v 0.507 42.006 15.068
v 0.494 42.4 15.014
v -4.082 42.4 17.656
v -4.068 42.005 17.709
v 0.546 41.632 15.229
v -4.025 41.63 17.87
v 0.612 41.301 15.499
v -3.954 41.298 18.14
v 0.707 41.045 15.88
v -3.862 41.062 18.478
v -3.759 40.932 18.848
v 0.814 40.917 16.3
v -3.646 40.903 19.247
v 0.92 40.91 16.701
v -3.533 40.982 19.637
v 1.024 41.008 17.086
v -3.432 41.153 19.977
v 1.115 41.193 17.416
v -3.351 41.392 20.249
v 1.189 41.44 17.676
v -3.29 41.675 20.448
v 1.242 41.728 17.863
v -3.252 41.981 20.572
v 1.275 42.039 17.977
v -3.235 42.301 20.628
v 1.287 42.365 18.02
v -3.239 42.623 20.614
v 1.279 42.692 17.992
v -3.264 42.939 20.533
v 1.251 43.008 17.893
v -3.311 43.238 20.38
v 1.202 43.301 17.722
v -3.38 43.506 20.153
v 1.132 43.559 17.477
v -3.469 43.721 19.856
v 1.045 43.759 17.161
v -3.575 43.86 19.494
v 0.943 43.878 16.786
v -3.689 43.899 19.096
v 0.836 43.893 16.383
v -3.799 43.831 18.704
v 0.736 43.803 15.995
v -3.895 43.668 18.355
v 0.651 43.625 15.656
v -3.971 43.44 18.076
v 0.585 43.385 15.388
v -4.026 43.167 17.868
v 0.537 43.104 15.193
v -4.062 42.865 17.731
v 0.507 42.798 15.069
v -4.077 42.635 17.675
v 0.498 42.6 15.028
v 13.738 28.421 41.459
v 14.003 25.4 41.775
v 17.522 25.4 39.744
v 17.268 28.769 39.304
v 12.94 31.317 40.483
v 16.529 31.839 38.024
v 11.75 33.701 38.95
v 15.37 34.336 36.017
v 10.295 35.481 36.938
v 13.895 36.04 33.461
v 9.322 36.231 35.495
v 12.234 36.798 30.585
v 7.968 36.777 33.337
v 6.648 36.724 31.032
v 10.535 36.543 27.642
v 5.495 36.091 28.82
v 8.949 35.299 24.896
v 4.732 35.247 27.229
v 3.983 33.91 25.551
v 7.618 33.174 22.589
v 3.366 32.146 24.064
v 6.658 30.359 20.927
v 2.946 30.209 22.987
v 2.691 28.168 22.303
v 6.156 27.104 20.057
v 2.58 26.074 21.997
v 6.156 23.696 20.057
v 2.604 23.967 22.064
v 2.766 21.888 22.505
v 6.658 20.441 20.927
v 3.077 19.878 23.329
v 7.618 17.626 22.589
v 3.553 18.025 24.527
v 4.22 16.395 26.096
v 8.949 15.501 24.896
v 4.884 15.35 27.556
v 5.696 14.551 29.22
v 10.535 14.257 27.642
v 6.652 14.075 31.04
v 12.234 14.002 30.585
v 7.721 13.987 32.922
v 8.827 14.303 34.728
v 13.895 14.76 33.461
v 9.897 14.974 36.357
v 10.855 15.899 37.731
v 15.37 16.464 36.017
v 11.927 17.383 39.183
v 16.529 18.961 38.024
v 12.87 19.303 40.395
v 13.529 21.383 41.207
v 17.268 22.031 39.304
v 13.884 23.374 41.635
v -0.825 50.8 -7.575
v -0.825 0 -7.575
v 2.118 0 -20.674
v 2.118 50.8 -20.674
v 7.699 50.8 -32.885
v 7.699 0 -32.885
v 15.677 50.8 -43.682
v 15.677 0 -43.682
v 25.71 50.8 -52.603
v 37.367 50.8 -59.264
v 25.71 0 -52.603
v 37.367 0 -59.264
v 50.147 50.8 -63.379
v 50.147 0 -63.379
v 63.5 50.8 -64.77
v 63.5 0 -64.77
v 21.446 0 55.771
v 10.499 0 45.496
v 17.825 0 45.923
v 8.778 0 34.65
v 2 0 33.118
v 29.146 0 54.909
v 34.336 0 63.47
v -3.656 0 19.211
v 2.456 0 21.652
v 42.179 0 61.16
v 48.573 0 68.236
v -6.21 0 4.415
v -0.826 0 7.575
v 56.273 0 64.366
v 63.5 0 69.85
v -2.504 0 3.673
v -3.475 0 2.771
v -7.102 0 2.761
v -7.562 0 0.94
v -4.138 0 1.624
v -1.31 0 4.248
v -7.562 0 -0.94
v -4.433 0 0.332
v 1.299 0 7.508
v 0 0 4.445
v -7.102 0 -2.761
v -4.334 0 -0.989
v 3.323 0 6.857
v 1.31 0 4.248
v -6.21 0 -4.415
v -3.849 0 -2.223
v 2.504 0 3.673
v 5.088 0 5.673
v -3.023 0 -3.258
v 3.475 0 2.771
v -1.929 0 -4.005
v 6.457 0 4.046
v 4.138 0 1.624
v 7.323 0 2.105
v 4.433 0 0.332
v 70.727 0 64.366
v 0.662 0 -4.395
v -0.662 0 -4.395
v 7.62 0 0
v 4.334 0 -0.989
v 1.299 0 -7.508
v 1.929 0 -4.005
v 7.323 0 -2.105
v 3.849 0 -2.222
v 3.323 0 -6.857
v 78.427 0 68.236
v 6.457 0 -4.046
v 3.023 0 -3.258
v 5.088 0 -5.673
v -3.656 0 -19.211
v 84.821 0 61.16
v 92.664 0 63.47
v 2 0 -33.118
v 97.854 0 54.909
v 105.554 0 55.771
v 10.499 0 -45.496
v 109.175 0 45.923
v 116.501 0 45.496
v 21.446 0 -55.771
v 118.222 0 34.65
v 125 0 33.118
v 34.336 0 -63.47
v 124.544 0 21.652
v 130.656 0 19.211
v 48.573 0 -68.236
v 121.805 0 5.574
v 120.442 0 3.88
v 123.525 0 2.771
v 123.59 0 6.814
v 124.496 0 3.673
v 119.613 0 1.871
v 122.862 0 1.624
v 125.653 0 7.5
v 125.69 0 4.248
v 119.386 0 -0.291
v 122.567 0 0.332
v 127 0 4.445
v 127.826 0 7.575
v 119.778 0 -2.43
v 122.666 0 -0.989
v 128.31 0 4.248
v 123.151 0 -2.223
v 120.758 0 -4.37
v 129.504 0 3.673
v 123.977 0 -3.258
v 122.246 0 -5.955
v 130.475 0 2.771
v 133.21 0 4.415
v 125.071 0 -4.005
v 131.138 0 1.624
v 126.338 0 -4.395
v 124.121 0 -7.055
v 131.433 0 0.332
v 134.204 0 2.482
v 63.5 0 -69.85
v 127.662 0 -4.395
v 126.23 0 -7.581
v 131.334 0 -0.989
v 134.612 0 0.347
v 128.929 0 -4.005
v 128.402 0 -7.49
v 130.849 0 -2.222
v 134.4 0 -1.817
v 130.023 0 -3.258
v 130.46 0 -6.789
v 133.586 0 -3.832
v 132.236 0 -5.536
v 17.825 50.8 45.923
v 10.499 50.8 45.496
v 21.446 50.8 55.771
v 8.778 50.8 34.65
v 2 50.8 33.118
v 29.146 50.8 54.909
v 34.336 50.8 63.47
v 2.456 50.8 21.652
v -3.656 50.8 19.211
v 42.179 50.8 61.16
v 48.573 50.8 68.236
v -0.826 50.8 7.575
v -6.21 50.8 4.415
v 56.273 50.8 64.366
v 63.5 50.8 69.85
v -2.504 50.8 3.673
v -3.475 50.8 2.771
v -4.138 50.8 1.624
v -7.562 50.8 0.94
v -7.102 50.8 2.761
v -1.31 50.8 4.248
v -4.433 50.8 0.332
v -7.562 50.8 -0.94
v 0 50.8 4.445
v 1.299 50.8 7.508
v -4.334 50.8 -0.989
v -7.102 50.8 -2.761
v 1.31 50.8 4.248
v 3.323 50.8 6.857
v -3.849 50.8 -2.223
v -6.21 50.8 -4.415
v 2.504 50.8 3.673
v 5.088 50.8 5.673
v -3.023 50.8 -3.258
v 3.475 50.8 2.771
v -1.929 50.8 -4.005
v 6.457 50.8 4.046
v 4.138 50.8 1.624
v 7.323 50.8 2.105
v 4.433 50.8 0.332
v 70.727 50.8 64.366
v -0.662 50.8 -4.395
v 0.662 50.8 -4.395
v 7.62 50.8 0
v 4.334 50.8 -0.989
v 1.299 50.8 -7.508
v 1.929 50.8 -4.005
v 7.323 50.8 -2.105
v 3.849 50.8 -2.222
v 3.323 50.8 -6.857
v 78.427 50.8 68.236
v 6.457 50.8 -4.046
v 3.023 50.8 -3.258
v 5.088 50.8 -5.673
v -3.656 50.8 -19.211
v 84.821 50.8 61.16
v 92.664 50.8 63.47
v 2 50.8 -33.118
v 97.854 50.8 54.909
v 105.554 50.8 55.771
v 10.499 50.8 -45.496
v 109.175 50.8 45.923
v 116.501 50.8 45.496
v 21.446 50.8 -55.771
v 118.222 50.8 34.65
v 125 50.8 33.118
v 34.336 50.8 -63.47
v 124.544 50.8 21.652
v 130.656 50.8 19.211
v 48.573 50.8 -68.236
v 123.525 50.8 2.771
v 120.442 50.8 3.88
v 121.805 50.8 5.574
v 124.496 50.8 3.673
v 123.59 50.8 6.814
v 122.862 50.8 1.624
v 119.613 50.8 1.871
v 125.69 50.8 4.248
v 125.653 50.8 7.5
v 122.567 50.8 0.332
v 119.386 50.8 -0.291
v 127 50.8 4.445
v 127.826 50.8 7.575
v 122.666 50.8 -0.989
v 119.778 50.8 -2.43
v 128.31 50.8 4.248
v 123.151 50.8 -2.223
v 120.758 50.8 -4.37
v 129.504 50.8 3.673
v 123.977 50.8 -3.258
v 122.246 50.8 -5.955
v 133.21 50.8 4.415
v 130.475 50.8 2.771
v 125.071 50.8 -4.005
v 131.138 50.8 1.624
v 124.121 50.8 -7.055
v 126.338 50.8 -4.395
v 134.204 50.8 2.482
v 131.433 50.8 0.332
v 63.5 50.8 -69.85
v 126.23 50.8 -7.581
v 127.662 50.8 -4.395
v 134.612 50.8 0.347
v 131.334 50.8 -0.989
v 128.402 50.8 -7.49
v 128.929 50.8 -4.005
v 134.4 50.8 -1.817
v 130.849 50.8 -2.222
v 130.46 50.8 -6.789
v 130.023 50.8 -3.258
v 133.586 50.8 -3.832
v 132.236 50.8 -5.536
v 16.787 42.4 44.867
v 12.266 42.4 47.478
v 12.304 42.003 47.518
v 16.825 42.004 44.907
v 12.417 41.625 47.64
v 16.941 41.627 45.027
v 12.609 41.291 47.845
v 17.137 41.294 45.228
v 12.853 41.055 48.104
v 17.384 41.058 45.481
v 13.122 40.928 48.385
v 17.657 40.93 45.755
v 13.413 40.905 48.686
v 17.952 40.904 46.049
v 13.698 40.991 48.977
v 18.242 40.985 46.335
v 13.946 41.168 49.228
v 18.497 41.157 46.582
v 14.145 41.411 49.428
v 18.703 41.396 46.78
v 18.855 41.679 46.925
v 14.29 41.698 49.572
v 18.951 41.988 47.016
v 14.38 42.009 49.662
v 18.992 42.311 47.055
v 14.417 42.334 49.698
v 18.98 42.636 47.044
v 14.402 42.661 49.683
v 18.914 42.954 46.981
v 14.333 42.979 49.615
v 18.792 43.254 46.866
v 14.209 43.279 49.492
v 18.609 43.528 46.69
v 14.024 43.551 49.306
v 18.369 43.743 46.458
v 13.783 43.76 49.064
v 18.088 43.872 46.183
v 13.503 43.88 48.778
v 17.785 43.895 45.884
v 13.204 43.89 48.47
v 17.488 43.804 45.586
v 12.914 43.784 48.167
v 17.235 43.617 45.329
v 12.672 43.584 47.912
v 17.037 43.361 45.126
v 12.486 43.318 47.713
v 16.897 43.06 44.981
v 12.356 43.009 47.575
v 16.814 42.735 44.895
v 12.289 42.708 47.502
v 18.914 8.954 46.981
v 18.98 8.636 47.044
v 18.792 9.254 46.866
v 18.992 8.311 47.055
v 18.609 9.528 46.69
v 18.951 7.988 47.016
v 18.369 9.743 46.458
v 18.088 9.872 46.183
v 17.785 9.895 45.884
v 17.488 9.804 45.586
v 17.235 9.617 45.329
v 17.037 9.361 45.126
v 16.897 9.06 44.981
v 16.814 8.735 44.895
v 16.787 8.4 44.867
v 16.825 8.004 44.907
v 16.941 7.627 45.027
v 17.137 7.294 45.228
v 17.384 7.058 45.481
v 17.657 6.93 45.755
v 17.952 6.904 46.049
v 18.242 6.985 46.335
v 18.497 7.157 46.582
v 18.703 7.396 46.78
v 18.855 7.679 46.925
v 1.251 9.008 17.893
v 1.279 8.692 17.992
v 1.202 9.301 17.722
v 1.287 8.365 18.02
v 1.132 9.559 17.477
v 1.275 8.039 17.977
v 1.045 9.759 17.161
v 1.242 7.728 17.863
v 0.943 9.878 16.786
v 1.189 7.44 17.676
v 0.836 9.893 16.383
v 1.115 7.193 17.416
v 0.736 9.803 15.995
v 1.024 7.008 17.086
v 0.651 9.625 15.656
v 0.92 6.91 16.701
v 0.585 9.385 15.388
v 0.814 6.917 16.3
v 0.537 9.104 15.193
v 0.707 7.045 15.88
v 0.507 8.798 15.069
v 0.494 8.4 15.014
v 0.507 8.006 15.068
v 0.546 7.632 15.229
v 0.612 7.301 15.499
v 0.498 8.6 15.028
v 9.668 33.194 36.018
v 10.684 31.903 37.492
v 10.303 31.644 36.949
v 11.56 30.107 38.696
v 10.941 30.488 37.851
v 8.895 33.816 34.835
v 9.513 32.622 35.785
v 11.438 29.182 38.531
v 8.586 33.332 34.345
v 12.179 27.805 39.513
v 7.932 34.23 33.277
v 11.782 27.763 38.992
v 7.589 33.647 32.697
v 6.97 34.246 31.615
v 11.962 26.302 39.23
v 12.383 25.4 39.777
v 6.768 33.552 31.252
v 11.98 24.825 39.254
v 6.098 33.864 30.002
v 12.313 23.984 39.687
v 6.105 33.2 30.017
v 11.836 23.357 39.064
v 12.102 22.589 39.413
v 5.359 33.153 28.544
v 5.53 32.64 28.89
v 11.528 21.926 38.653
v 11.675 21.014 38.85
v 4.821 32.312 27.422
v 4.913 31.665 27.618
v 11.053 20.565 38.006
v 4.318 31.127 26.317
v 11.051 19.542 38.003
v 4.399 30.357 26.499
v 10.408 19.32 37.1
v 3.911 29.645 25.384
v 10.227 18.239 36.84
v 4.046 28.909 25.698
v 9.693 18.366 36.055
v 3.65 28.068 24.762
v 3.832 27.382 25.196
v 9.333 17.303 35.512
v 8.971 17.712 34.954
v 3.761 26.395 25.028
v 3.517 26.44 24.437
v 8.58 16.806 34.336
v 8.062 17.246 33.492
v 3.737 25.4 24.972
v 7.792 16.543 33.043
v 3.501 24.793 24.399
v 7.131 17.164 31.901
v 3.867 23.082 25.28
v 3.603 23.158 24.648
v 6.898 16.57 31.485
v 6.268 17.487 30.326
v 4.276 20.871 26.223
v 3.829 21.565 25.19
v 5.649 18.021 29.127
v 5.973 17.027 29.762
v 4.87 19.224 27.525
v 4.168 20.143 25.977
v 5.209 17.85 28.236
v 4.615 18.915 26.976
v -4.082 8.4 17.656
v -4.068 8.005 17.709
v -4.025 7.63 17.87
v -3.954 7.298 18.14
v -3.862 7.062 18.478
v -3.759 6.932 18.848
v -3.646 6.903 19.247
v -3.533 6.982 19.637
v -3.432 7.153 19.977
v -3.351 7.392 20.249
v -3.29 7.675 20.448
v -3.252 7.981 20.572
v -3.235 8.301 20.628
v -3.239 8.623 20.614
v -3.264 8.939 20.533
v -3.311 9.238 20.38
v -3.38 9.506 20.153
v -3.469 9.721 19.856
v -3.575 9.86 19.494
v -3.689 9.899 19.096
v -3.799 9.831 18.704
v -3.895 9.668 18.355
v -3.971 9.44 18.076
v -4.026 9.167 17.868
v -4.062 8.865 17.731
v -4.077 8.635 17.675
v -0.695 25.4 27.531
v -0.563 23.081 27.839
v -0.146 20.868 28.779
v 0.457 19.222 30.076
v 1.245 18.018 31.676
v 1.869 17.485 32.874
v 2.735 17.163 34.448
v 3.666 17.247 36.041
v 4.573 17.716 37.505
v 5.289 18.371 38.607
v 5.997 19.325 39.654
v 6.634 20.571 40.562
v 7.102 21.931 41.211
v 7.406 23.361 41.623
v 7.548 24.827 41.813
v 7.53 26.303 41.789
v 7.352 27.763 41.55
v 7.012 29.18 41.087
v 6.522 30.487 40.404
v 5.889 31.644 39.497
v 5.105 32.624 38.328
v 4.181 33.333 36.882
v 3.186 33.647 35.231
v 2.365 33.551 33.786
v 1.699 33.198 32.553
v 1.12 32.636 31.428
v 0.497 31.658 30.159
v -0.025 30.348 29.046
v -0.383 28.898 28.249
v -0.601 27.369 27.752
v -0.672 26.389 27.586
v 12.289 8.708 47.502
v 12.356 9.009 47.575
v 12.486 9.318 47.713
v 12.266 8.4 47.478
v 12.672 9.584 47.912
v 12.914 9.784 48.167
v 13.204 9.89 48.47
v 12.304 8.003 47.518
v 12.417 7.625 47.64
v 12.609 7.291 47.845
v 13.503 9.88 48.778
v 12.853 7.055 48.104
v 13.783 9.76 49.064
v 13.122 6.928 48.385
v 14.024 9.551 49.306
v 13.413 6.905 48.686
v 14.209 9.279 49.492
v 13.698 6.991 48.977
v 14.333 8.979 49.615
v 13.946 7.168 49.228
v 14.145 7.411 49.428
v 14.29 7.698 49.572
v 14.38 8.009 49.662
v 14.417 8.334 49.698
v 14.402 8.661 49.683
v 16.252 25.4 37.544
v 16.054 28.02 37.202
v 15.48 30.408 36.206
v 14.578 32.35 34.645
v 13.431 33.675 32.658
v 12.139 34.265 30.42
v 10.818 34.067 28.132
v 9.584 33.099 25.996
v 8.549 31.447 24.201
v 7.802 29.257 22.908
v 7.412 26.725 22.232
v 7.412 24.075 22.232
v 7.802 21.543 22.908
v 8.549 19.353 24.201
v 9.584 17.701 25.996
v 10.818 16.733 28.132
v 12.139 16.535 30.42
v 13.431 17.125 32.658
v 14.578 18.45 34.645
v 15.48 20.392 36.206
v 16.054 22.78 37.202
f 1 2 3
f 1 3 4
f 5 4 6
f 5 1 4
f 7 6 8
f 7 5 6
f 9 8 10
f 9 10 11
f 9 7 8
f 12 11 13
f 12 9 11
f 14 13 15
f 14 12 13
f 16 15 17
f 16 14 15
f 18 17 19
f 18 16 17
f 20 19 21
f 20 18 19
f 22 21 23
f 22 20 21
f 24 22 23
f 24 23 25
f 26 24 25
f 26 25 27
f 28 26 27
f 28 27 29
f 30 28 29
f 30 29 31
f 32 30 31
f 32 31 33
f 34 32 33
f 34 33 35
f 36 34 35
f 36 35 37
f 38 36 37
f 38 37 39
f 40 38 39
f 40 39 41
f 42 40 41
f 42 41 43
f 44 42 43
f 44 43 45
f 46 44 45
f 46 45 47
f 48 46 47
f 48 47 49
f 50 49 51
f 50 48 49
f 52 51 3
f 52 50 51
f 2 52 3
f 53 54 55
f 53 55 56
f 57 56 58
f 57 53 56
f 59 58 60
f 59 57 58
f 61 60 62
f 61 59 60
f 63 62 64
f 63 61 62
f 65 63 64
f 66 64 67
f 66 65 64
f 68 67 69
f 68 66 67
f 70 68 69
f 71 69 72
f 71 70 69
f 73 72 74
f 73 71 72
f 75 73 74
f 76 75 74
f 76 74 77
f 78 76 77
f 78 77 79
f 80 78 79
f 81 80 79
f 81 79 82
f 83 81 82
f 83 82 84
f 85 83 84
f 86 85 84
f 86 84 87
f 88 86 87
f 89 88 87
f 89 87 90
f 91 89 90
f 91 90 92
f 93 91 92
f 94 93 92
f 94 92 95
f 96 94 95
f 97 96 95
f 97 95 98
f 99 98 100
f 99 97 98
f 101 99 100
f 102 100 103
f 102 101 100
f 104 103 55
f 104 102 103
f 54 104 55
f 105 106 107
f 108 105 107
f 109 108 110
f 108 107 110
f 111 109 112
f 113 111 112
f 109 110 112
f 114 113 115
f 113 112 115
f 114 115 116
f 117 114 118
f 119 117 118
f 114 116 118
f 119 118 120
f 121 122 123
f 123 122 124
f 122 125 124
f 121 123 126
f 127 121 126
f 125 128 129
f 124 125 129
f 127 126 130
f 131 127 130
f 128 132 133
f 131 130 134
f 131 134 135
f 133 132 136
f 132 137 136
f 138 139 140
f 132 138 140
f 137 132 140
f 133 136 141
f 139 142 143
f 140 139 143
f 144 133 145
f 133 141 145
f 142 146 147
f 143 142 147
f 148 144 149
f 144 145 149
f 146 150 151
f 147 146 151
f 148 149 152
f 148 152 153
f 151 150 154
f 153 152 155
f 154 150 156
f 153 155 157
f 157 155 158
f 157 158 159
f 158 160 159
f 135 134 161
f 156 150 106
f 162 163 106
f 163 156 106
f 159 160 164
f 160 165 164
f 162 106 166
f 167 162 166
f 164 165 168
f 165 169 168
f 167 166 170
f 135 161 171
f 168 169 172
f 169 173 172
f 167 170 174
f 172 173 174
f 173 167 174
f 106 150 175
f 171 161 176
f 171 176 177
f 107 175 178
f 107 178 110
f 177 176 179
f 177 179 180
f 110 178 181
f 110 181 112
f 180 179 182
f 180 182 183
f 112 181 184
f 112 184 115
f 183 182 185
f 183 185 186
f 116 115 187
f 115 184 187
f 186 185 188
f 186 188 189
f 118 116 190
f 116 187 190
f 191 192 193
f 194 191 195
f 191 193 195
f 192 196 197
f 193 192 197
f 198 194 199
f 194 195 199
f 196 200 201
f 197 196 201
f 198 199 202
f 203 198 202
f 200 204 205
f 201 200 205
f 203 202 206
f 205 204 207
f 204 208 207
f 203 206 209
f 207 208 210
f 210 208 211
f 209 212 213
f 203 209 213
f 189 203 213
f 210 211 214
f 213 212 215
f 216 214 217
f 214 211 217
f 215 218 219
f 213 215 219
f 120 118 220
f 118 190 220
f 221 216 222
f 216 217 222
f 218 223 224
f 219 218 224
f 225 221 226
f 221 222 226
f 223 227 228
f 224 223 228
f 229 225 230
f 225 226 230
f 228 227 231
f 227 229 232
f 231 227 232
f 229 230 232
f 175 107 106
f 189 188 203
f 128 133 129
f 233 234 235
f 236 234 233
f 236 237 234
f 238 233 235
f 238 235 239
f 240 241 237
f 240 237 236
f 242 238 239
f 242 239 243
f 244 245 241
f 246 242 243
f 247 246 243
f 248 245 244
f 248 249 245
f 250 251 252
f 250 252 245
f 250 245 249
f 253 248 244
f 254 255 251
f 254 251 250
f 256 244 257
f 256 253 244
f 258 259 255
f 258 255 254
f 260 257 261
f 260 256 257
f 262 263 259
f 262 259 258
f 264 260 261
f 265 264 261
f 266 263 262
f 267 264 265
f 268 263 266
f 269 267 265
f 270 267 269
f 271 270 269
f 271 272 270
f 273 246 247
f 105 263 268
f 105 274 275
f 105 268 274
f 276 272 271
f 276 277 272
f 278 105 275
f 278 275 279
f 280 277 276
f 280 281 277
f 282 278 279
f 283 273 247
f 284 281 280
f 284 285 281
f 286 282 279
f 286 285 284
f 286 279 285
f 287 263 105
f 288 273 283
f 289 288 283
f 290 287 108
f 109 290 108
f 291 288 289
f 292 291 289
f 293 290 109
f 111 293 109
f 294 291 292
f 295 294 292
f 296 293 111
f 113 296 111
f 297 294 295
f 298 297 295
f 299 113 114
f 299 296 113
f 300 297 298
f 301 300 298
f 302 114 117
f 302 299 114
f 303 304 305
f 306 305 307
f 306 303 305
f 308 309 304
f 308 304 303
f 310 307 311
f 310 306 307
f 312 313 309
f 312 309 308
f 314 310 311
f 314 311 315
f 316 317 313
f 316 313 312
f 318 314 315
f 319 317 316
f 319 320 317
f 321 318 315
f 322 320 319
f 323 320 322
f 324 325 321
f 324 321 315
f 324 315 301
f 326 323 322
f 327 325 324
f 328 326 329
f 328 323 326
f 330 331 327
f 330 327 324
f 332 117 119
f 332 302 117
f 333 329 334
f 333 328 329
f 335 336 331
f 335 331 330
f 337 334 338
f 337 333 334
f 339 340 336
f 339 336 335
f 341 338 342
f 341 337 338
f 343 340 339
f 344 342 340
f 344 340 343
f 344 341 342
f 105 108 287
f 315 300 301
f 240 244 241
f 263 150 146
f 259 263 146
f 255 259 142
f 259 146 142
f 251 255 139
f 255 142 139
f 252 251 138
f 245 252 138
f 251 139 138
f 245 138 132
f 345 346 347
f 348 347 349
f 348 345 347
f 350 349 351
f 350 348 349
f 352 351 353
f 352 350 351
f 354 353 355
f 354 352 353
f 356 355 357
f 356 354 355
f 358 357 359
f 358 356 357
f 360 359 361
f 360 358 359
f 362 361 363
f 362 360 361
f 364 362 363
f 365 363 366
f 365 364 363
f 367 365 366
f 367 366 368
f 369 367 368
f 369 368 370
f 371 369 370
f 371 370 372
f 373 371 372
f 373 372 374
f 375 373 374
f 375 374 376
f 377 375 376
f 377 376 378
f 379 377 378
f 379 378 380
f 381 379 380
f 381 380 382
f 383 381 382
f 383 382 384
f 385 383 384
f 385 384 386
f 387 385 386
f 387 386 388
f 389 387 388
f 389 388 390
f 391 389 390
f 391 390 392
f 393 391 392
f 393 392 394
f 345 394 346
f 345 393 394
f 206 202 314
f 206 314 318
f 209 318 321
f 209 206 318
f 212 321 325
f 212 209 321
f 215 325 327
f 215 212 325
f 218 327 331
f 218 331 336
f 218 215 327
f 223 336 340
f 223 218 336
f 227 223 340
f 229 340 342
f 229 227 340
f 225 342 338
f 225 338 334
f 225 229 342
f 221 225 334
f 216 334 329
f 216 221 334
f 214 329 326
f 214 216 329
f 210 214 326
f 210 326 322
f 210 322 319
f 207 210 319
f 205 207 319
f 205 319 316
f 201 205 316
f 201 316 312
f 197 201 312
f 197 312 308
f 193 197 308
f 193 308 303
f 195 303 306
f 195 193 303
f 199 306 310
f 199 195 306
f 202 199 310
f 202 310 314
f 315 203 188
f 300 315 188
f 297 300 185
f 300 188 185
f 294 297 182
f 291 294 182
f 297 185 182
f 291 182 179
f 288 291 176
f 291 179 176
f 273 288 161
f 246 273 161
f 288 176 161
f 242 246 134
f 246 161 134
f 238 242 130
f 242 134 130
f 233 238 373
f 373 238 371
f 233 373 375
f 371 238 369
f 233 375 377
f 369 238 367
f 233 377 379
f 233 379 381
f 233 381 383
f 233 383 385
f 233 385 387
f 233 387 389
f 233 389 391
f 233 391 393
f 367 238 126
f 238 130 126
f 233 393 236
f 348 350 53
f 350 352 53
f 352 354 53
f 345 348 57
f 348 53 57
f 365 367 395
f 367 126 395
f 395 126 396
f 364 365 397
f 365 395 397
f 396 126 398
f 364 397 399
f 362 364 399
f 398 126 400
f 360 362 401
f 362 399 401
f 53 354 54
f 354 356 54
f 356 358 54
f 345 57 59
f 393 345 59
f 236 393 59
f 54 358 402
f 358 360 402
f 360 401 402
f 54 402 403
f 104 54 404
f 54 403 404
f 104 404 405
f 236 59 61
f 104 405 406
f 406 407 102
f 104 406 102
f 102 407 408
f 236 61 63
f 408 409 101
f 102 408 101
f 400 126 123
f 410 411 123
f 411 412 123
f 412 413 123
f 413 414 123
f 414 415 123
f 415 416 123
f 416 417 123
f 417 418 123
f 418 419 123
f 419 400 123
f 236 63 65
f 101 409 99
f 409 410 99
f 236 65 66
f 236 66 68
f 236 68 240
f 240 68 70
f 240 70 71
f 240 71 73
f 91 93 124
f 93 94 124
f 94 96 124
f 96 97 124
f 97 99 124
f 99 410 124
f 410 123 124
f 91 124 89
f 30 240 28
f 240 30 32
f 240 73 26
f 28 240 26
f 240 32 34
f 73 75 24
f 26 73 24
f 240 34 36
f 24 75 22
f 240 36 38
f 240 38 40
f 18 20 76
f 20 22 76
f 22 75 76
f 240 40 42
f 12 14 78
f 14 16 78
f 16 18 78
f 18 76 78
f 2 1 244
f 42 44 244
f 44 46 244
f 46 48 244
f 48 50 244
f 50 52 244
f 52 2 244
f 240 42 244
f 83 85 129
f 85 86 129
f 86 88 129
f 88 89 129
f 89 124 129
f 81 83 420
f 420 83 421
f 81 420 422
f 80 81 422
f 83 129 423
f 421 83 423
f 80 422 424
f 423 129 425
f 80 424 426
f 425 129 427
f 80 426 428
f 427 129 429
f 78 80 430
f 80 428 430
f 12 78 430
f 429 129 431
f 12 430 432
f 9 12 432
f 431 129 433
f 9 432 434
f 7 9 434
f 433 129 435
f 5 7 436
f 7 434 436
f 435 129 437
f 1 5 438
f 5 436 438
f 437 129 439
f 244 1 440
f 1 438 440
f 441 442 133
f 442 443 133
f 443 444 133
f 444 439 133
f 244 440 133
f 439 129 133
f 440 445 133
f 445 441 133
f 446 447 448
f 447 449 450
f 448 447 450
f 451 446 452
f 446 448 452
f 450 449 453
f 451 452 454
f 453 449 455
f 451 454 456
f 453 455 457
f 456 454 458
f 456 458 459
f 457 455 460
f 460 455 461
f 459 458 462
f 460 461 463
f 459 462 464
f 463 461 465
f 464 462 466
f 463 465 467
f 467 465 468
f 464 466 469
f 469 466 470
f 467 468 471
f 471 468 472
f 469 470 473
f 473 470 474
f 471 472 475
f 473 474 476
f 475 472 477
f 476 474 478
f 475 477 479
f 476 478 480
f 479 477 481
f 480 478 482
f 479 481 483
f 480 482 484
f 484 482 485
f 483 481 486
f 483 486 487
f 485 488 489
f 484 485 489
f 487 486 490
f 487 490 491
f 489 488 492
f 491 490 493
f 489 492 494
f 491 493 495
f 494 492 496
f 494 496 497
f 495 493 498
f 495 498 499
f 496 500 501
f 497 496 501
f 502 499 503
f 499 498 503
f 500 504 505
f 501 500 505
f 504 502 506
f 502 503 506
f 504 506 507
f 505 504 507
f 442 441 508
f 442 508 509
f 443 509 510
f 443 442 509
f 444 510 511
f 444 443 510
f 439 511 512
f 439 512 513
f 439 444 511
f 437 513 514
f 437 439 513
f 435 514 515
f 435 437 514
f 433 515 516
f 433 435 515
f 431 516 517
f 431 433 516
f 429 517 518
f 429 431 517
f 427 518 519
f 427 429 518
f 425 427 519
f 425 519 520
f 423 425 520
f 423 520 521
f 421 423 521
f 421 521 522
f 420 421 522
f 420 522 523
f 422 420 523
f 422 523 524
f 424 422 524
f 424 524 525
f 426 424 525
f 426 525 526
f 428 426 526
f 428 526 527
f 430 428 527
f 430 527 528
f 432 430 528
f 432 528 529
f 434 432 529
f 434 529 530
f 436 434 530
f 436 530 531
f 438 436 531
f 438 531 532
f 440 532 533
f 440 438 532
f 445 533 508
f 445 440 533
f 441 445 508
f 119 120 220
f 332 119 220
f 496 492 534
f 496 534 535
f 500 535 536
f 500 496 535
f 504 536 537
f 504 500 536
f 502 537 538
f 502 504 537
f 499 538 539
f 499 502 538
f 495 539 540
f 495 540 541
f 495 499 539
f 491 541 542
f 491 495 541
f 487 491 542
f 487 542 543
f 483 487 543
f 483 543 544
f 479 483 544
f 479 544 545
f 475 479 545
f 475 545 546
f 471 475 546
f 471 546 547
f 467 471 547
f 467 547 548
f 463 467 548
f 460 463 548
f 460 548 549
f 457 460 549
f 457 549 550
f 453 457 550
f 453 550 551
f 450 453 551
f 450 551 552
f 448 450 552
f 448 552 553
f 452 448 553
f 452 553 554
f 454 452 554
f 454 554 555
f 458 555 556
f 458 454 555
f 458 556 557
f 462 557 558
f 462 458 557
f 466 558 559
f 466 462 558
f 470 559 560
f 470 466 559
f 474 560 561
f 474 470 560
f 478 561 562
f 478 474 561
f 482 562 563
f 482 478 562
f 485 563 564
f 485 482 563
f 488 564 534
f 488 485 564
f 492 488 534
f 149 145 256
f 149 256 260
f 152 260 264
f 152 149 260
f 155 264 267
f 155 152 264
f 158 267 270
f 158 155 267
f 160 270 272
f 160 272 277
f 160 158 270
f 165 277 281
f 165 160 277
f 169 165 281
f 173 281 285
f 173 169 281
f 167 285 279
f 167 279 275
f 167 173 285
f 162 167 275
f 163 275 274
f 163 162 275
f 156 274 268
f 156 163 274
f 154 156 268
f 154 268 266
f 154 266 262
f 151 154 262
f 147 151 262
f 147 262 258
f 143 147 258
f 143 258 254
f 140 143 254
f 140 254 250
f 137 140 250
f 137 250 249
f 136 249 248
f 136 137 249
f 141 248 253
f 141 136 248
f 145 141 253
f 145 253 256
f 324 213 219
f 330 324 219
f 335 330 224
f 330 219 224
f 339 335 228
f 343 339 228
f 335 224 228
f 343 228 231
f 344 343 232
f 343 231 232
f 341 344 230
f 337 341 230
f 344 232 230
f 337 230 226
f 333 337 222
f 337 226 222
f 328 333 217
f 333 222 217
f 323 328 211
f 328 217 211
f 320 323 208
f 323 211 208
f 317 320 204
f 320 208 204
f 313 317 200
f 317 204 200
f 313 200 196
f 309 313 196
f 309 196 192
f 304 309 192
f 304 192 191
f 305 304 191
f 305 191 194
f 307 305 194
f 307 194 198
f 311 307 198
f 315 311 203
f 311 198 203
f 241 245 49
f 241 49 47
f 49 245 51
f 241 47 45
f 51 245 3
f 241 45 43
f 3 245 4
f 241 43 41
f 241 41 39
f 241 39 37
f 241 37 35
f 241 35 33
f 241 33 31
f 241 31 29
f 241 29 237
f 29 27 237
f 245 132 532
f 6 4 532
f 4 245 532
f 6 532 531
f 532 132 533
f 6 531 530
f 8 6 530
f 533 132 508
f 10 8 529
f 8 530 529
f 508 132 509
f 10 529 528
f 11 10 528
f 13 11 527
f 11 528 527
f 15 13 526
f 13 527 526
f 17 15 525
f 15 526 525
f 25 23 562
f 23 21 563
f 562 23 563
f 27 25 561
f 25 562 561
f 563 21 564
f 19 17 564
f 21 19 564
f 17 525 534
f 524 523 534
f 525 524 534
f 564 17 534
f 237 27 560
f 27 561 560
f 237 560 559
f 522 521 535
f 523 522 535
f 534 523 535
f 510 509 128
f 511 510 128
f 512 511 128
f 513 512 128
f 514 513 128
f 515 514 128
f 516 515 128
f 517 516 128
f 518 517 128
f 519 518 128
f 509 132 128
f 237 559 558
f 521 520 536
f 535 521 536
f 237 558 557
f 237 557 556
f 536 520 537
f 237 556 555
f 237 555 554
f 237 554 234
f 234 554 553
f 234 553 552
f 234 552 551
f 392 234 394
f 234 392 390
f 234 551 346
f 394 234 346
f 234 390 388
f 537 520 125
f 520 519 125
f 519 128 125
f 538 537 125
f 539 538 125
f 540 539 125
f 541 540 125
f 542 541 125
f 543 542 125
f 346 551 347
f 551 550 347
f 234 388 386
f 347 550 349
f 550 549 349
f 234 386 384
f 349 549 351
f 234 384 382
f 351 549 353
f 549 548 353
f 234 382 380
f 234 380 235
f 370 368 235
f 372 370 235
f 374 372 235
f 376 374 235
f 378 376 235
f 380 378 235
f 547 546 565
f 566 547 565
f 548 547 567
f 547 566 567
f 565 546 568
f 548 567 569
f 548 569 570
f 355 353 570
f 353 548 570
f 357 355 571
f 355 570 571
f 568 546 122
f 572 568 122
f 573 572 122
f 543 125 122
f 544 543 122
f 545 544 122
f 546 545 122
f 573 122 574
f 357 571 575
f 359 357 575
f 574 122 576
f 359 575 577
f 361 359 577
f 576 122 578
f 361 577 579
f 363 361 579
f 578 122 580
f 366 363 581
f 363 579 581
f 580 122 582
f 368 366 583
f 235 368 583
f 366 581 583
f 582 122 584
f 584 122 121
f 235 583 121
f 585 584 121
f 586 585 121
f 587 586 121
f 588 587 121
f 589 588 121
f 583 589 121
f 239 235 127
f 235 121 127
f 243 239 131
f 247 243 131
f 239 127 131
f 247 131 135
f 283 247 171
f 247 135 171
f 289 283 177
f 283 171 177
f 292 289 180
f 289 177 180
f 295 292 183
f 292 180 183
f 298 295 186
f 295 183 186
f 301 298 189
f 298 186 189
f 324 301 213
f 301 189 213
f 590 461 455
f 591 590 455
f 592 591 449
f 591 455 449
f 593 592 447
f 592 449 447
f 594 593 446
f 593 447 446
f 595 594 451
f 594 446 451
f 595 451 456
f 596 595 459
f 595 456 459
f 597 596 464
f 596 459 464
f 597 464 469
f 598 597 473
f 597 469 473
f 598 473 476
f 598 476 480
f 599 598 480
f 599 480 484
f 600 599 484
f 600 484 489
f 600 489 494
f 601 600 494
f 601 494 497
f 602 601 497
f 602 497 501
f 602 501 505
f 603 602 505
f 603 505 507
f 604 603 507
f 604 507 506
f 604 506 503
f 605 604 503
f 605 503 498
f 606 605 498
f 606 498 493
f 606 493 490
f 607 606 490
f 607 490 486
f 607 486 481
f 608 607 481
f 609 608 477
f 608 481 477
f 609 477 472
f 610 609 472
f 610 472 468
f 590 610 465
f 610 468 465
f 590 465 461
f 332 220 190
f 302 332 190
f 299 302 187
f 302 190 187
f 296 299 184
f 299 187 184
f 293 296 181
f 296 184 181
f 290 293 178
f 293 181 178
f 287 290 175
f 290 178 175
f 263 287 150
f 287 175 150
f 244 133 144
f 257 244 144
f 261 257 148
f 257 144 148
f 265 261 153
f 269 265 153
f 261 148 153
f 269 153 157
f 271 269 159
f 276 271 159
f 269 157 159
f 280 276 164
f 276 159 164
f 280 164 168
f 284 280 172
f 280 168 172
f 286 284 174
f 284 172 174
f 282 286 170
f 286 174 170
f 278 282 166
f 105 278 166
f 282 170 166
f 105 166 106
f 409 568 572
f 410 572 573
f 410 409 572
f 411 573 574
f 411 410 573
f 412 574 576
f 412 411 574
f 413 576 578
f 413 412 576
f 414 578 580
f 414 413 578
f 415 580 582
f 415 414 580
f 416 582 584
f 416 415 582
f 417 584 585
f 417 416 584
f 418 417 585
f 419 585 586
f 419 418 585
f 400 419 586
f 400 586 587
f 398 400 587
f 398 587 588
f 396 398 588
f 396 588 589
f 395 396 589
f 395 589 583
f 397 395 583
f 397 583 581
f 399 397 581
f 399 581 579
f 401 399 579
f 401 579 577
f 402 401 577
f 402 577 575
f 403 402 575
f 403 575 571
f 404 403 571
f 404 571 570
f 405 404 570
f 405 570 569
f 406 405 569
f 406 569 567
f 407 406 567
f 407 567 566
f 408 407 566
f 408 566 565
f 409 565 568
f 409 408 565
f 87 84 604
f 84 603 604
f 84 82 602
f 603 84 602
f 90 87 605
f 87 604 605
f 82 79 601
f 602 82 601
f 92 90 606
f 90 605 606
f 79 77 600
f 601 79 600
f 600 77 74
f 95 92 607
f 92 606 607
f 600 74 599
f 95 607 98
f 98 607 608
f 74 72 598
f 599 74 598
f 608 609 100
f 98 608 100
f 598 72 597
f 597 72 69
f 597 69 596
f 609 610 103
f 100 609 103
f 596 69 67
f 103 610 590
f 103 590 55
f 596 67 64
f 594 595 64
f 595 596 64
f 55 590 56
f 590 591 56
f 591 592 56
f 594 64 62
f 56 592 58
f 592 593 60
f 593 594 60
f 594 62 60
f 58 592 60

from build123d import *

# Parameters (mm, degrees)
SKETCH1_R           = 4.445
BOSS_EXTRUDE2_DEPTH = 50.8
SKETCH2_R           = 8.255
CUT_EXTRUDE1_DEPTH  = 141.089519336
SKETCH3_R           = 1.5
CUT_EXTRUDE2_DEPTH  = 141.089519442
SKETCH4_R           = 11.43
SKETCH4_R_2         = 8.89
BOSS_EXTRUDE3_DEPTH = 6.35


with BuildPart() as part:
    # Sketch1 → Boss-Extrude2 (new body)
    with BuildSketch(Plane(origin=(0, 0, 0), x_dir=(1, 0, 0), z_dir=(0, 1, 0))):
        with BuildLine():
            ThreePointArc((-0.8255, 7.575153447), (20.462166579, 48.403489486), (63.5, 64.77))
            Line((63.5, 64.77), (63.5, 69.85))
            ThreePointArc((63.5, 69.85), (15.695186698, 50.928600267), (-6.2103, 4.415492488))
            ThreePointArc((-6.2103, 4.415492488), (-7.62, 0), (-6.2103, -4.415492488))
            ThreePointArc((-6.2103, -4.415492488), (63.5, -69.85), (133.2103, -4.415492488))
            ThreePointArc((133.2103, -4.415492488), (123.143643591, 6.572131712), (127.8255, -7.575153447))
            ThreePointArc((127.8255, -7.575153447), (63.5, -64.77), (-0.8255, -7.575153447))
            ThreePointArc((-0.8255, -7.575153447), (7.62, 0), (-0.8255, 7.575153447))
        make_face()
        Circle(SKETCH1_R, mode=Mode.SUBTRACT)
        with Locations((127, 0)):
            Circle(SKETCH1_R, mode=Mode.SUBTRACT)
    extrude(amount=BOSS_EXTRUDE2_DEPTH)

    # Sketch2 → Cut-Extrude1 (cut, through all)
    with BuildSketch(Plane(origin=(47.625, 0, -27.49630657), x_dir=(0, -1, 0), z_dir=(-0.8660254037844398, 0, 0.499999999999998))):
        with Locations((-25.4, 31.75)):
            Circle(SKETCH2_R)
    extrude(amount=CUT_EXTRUDE1_DEPTH, mode=Mode.SUBTRACT)

    # Sketch3 → Cut-Extrude2 (cut, through all)
    with BuildSketch(Plane(origin=(47.625, 0, -27.49630657), x_dir=(0, -1, 0), z_dir=(-0.8660254037844398, 0, 0.499999999999998))):
        with Locations((-42.4, 14.75)):
            Circle(SKETCH3_R)
        with Locations((-8.4, 14.75)):
            Circle(SKETCH3_R)
        with Locations((-8.4, 48.75)):
            Circle(SKETCH3_R)
        with Locations((-42.4, 48.75)):
            Circle(SKETCH3_R)
    extrude(amount=CUT_EXTRUDE2_DEPTH, mode=Mode.SUBTRACT)

    # Sketch4 → Boss-Extrude3 (add)
    with BuildSketch(Plane(origin=(-9.567317666, 0, 5.52369343), x_dir=(0, -1, 0), z_dir=(-0.8660254037844398, 0, 0.499999999999998))):
        with Locations((-25.4, 31.75)):
            Circle(SKETCH4_R)
        with Locations((-25.4, 31.75)):
            Circle(SKETCH4_R_2, mode=Mode.SUBTRACT)
    extrude(amount=-BOSS_EXTRUDE3_DEPTH)


solid = part.part
